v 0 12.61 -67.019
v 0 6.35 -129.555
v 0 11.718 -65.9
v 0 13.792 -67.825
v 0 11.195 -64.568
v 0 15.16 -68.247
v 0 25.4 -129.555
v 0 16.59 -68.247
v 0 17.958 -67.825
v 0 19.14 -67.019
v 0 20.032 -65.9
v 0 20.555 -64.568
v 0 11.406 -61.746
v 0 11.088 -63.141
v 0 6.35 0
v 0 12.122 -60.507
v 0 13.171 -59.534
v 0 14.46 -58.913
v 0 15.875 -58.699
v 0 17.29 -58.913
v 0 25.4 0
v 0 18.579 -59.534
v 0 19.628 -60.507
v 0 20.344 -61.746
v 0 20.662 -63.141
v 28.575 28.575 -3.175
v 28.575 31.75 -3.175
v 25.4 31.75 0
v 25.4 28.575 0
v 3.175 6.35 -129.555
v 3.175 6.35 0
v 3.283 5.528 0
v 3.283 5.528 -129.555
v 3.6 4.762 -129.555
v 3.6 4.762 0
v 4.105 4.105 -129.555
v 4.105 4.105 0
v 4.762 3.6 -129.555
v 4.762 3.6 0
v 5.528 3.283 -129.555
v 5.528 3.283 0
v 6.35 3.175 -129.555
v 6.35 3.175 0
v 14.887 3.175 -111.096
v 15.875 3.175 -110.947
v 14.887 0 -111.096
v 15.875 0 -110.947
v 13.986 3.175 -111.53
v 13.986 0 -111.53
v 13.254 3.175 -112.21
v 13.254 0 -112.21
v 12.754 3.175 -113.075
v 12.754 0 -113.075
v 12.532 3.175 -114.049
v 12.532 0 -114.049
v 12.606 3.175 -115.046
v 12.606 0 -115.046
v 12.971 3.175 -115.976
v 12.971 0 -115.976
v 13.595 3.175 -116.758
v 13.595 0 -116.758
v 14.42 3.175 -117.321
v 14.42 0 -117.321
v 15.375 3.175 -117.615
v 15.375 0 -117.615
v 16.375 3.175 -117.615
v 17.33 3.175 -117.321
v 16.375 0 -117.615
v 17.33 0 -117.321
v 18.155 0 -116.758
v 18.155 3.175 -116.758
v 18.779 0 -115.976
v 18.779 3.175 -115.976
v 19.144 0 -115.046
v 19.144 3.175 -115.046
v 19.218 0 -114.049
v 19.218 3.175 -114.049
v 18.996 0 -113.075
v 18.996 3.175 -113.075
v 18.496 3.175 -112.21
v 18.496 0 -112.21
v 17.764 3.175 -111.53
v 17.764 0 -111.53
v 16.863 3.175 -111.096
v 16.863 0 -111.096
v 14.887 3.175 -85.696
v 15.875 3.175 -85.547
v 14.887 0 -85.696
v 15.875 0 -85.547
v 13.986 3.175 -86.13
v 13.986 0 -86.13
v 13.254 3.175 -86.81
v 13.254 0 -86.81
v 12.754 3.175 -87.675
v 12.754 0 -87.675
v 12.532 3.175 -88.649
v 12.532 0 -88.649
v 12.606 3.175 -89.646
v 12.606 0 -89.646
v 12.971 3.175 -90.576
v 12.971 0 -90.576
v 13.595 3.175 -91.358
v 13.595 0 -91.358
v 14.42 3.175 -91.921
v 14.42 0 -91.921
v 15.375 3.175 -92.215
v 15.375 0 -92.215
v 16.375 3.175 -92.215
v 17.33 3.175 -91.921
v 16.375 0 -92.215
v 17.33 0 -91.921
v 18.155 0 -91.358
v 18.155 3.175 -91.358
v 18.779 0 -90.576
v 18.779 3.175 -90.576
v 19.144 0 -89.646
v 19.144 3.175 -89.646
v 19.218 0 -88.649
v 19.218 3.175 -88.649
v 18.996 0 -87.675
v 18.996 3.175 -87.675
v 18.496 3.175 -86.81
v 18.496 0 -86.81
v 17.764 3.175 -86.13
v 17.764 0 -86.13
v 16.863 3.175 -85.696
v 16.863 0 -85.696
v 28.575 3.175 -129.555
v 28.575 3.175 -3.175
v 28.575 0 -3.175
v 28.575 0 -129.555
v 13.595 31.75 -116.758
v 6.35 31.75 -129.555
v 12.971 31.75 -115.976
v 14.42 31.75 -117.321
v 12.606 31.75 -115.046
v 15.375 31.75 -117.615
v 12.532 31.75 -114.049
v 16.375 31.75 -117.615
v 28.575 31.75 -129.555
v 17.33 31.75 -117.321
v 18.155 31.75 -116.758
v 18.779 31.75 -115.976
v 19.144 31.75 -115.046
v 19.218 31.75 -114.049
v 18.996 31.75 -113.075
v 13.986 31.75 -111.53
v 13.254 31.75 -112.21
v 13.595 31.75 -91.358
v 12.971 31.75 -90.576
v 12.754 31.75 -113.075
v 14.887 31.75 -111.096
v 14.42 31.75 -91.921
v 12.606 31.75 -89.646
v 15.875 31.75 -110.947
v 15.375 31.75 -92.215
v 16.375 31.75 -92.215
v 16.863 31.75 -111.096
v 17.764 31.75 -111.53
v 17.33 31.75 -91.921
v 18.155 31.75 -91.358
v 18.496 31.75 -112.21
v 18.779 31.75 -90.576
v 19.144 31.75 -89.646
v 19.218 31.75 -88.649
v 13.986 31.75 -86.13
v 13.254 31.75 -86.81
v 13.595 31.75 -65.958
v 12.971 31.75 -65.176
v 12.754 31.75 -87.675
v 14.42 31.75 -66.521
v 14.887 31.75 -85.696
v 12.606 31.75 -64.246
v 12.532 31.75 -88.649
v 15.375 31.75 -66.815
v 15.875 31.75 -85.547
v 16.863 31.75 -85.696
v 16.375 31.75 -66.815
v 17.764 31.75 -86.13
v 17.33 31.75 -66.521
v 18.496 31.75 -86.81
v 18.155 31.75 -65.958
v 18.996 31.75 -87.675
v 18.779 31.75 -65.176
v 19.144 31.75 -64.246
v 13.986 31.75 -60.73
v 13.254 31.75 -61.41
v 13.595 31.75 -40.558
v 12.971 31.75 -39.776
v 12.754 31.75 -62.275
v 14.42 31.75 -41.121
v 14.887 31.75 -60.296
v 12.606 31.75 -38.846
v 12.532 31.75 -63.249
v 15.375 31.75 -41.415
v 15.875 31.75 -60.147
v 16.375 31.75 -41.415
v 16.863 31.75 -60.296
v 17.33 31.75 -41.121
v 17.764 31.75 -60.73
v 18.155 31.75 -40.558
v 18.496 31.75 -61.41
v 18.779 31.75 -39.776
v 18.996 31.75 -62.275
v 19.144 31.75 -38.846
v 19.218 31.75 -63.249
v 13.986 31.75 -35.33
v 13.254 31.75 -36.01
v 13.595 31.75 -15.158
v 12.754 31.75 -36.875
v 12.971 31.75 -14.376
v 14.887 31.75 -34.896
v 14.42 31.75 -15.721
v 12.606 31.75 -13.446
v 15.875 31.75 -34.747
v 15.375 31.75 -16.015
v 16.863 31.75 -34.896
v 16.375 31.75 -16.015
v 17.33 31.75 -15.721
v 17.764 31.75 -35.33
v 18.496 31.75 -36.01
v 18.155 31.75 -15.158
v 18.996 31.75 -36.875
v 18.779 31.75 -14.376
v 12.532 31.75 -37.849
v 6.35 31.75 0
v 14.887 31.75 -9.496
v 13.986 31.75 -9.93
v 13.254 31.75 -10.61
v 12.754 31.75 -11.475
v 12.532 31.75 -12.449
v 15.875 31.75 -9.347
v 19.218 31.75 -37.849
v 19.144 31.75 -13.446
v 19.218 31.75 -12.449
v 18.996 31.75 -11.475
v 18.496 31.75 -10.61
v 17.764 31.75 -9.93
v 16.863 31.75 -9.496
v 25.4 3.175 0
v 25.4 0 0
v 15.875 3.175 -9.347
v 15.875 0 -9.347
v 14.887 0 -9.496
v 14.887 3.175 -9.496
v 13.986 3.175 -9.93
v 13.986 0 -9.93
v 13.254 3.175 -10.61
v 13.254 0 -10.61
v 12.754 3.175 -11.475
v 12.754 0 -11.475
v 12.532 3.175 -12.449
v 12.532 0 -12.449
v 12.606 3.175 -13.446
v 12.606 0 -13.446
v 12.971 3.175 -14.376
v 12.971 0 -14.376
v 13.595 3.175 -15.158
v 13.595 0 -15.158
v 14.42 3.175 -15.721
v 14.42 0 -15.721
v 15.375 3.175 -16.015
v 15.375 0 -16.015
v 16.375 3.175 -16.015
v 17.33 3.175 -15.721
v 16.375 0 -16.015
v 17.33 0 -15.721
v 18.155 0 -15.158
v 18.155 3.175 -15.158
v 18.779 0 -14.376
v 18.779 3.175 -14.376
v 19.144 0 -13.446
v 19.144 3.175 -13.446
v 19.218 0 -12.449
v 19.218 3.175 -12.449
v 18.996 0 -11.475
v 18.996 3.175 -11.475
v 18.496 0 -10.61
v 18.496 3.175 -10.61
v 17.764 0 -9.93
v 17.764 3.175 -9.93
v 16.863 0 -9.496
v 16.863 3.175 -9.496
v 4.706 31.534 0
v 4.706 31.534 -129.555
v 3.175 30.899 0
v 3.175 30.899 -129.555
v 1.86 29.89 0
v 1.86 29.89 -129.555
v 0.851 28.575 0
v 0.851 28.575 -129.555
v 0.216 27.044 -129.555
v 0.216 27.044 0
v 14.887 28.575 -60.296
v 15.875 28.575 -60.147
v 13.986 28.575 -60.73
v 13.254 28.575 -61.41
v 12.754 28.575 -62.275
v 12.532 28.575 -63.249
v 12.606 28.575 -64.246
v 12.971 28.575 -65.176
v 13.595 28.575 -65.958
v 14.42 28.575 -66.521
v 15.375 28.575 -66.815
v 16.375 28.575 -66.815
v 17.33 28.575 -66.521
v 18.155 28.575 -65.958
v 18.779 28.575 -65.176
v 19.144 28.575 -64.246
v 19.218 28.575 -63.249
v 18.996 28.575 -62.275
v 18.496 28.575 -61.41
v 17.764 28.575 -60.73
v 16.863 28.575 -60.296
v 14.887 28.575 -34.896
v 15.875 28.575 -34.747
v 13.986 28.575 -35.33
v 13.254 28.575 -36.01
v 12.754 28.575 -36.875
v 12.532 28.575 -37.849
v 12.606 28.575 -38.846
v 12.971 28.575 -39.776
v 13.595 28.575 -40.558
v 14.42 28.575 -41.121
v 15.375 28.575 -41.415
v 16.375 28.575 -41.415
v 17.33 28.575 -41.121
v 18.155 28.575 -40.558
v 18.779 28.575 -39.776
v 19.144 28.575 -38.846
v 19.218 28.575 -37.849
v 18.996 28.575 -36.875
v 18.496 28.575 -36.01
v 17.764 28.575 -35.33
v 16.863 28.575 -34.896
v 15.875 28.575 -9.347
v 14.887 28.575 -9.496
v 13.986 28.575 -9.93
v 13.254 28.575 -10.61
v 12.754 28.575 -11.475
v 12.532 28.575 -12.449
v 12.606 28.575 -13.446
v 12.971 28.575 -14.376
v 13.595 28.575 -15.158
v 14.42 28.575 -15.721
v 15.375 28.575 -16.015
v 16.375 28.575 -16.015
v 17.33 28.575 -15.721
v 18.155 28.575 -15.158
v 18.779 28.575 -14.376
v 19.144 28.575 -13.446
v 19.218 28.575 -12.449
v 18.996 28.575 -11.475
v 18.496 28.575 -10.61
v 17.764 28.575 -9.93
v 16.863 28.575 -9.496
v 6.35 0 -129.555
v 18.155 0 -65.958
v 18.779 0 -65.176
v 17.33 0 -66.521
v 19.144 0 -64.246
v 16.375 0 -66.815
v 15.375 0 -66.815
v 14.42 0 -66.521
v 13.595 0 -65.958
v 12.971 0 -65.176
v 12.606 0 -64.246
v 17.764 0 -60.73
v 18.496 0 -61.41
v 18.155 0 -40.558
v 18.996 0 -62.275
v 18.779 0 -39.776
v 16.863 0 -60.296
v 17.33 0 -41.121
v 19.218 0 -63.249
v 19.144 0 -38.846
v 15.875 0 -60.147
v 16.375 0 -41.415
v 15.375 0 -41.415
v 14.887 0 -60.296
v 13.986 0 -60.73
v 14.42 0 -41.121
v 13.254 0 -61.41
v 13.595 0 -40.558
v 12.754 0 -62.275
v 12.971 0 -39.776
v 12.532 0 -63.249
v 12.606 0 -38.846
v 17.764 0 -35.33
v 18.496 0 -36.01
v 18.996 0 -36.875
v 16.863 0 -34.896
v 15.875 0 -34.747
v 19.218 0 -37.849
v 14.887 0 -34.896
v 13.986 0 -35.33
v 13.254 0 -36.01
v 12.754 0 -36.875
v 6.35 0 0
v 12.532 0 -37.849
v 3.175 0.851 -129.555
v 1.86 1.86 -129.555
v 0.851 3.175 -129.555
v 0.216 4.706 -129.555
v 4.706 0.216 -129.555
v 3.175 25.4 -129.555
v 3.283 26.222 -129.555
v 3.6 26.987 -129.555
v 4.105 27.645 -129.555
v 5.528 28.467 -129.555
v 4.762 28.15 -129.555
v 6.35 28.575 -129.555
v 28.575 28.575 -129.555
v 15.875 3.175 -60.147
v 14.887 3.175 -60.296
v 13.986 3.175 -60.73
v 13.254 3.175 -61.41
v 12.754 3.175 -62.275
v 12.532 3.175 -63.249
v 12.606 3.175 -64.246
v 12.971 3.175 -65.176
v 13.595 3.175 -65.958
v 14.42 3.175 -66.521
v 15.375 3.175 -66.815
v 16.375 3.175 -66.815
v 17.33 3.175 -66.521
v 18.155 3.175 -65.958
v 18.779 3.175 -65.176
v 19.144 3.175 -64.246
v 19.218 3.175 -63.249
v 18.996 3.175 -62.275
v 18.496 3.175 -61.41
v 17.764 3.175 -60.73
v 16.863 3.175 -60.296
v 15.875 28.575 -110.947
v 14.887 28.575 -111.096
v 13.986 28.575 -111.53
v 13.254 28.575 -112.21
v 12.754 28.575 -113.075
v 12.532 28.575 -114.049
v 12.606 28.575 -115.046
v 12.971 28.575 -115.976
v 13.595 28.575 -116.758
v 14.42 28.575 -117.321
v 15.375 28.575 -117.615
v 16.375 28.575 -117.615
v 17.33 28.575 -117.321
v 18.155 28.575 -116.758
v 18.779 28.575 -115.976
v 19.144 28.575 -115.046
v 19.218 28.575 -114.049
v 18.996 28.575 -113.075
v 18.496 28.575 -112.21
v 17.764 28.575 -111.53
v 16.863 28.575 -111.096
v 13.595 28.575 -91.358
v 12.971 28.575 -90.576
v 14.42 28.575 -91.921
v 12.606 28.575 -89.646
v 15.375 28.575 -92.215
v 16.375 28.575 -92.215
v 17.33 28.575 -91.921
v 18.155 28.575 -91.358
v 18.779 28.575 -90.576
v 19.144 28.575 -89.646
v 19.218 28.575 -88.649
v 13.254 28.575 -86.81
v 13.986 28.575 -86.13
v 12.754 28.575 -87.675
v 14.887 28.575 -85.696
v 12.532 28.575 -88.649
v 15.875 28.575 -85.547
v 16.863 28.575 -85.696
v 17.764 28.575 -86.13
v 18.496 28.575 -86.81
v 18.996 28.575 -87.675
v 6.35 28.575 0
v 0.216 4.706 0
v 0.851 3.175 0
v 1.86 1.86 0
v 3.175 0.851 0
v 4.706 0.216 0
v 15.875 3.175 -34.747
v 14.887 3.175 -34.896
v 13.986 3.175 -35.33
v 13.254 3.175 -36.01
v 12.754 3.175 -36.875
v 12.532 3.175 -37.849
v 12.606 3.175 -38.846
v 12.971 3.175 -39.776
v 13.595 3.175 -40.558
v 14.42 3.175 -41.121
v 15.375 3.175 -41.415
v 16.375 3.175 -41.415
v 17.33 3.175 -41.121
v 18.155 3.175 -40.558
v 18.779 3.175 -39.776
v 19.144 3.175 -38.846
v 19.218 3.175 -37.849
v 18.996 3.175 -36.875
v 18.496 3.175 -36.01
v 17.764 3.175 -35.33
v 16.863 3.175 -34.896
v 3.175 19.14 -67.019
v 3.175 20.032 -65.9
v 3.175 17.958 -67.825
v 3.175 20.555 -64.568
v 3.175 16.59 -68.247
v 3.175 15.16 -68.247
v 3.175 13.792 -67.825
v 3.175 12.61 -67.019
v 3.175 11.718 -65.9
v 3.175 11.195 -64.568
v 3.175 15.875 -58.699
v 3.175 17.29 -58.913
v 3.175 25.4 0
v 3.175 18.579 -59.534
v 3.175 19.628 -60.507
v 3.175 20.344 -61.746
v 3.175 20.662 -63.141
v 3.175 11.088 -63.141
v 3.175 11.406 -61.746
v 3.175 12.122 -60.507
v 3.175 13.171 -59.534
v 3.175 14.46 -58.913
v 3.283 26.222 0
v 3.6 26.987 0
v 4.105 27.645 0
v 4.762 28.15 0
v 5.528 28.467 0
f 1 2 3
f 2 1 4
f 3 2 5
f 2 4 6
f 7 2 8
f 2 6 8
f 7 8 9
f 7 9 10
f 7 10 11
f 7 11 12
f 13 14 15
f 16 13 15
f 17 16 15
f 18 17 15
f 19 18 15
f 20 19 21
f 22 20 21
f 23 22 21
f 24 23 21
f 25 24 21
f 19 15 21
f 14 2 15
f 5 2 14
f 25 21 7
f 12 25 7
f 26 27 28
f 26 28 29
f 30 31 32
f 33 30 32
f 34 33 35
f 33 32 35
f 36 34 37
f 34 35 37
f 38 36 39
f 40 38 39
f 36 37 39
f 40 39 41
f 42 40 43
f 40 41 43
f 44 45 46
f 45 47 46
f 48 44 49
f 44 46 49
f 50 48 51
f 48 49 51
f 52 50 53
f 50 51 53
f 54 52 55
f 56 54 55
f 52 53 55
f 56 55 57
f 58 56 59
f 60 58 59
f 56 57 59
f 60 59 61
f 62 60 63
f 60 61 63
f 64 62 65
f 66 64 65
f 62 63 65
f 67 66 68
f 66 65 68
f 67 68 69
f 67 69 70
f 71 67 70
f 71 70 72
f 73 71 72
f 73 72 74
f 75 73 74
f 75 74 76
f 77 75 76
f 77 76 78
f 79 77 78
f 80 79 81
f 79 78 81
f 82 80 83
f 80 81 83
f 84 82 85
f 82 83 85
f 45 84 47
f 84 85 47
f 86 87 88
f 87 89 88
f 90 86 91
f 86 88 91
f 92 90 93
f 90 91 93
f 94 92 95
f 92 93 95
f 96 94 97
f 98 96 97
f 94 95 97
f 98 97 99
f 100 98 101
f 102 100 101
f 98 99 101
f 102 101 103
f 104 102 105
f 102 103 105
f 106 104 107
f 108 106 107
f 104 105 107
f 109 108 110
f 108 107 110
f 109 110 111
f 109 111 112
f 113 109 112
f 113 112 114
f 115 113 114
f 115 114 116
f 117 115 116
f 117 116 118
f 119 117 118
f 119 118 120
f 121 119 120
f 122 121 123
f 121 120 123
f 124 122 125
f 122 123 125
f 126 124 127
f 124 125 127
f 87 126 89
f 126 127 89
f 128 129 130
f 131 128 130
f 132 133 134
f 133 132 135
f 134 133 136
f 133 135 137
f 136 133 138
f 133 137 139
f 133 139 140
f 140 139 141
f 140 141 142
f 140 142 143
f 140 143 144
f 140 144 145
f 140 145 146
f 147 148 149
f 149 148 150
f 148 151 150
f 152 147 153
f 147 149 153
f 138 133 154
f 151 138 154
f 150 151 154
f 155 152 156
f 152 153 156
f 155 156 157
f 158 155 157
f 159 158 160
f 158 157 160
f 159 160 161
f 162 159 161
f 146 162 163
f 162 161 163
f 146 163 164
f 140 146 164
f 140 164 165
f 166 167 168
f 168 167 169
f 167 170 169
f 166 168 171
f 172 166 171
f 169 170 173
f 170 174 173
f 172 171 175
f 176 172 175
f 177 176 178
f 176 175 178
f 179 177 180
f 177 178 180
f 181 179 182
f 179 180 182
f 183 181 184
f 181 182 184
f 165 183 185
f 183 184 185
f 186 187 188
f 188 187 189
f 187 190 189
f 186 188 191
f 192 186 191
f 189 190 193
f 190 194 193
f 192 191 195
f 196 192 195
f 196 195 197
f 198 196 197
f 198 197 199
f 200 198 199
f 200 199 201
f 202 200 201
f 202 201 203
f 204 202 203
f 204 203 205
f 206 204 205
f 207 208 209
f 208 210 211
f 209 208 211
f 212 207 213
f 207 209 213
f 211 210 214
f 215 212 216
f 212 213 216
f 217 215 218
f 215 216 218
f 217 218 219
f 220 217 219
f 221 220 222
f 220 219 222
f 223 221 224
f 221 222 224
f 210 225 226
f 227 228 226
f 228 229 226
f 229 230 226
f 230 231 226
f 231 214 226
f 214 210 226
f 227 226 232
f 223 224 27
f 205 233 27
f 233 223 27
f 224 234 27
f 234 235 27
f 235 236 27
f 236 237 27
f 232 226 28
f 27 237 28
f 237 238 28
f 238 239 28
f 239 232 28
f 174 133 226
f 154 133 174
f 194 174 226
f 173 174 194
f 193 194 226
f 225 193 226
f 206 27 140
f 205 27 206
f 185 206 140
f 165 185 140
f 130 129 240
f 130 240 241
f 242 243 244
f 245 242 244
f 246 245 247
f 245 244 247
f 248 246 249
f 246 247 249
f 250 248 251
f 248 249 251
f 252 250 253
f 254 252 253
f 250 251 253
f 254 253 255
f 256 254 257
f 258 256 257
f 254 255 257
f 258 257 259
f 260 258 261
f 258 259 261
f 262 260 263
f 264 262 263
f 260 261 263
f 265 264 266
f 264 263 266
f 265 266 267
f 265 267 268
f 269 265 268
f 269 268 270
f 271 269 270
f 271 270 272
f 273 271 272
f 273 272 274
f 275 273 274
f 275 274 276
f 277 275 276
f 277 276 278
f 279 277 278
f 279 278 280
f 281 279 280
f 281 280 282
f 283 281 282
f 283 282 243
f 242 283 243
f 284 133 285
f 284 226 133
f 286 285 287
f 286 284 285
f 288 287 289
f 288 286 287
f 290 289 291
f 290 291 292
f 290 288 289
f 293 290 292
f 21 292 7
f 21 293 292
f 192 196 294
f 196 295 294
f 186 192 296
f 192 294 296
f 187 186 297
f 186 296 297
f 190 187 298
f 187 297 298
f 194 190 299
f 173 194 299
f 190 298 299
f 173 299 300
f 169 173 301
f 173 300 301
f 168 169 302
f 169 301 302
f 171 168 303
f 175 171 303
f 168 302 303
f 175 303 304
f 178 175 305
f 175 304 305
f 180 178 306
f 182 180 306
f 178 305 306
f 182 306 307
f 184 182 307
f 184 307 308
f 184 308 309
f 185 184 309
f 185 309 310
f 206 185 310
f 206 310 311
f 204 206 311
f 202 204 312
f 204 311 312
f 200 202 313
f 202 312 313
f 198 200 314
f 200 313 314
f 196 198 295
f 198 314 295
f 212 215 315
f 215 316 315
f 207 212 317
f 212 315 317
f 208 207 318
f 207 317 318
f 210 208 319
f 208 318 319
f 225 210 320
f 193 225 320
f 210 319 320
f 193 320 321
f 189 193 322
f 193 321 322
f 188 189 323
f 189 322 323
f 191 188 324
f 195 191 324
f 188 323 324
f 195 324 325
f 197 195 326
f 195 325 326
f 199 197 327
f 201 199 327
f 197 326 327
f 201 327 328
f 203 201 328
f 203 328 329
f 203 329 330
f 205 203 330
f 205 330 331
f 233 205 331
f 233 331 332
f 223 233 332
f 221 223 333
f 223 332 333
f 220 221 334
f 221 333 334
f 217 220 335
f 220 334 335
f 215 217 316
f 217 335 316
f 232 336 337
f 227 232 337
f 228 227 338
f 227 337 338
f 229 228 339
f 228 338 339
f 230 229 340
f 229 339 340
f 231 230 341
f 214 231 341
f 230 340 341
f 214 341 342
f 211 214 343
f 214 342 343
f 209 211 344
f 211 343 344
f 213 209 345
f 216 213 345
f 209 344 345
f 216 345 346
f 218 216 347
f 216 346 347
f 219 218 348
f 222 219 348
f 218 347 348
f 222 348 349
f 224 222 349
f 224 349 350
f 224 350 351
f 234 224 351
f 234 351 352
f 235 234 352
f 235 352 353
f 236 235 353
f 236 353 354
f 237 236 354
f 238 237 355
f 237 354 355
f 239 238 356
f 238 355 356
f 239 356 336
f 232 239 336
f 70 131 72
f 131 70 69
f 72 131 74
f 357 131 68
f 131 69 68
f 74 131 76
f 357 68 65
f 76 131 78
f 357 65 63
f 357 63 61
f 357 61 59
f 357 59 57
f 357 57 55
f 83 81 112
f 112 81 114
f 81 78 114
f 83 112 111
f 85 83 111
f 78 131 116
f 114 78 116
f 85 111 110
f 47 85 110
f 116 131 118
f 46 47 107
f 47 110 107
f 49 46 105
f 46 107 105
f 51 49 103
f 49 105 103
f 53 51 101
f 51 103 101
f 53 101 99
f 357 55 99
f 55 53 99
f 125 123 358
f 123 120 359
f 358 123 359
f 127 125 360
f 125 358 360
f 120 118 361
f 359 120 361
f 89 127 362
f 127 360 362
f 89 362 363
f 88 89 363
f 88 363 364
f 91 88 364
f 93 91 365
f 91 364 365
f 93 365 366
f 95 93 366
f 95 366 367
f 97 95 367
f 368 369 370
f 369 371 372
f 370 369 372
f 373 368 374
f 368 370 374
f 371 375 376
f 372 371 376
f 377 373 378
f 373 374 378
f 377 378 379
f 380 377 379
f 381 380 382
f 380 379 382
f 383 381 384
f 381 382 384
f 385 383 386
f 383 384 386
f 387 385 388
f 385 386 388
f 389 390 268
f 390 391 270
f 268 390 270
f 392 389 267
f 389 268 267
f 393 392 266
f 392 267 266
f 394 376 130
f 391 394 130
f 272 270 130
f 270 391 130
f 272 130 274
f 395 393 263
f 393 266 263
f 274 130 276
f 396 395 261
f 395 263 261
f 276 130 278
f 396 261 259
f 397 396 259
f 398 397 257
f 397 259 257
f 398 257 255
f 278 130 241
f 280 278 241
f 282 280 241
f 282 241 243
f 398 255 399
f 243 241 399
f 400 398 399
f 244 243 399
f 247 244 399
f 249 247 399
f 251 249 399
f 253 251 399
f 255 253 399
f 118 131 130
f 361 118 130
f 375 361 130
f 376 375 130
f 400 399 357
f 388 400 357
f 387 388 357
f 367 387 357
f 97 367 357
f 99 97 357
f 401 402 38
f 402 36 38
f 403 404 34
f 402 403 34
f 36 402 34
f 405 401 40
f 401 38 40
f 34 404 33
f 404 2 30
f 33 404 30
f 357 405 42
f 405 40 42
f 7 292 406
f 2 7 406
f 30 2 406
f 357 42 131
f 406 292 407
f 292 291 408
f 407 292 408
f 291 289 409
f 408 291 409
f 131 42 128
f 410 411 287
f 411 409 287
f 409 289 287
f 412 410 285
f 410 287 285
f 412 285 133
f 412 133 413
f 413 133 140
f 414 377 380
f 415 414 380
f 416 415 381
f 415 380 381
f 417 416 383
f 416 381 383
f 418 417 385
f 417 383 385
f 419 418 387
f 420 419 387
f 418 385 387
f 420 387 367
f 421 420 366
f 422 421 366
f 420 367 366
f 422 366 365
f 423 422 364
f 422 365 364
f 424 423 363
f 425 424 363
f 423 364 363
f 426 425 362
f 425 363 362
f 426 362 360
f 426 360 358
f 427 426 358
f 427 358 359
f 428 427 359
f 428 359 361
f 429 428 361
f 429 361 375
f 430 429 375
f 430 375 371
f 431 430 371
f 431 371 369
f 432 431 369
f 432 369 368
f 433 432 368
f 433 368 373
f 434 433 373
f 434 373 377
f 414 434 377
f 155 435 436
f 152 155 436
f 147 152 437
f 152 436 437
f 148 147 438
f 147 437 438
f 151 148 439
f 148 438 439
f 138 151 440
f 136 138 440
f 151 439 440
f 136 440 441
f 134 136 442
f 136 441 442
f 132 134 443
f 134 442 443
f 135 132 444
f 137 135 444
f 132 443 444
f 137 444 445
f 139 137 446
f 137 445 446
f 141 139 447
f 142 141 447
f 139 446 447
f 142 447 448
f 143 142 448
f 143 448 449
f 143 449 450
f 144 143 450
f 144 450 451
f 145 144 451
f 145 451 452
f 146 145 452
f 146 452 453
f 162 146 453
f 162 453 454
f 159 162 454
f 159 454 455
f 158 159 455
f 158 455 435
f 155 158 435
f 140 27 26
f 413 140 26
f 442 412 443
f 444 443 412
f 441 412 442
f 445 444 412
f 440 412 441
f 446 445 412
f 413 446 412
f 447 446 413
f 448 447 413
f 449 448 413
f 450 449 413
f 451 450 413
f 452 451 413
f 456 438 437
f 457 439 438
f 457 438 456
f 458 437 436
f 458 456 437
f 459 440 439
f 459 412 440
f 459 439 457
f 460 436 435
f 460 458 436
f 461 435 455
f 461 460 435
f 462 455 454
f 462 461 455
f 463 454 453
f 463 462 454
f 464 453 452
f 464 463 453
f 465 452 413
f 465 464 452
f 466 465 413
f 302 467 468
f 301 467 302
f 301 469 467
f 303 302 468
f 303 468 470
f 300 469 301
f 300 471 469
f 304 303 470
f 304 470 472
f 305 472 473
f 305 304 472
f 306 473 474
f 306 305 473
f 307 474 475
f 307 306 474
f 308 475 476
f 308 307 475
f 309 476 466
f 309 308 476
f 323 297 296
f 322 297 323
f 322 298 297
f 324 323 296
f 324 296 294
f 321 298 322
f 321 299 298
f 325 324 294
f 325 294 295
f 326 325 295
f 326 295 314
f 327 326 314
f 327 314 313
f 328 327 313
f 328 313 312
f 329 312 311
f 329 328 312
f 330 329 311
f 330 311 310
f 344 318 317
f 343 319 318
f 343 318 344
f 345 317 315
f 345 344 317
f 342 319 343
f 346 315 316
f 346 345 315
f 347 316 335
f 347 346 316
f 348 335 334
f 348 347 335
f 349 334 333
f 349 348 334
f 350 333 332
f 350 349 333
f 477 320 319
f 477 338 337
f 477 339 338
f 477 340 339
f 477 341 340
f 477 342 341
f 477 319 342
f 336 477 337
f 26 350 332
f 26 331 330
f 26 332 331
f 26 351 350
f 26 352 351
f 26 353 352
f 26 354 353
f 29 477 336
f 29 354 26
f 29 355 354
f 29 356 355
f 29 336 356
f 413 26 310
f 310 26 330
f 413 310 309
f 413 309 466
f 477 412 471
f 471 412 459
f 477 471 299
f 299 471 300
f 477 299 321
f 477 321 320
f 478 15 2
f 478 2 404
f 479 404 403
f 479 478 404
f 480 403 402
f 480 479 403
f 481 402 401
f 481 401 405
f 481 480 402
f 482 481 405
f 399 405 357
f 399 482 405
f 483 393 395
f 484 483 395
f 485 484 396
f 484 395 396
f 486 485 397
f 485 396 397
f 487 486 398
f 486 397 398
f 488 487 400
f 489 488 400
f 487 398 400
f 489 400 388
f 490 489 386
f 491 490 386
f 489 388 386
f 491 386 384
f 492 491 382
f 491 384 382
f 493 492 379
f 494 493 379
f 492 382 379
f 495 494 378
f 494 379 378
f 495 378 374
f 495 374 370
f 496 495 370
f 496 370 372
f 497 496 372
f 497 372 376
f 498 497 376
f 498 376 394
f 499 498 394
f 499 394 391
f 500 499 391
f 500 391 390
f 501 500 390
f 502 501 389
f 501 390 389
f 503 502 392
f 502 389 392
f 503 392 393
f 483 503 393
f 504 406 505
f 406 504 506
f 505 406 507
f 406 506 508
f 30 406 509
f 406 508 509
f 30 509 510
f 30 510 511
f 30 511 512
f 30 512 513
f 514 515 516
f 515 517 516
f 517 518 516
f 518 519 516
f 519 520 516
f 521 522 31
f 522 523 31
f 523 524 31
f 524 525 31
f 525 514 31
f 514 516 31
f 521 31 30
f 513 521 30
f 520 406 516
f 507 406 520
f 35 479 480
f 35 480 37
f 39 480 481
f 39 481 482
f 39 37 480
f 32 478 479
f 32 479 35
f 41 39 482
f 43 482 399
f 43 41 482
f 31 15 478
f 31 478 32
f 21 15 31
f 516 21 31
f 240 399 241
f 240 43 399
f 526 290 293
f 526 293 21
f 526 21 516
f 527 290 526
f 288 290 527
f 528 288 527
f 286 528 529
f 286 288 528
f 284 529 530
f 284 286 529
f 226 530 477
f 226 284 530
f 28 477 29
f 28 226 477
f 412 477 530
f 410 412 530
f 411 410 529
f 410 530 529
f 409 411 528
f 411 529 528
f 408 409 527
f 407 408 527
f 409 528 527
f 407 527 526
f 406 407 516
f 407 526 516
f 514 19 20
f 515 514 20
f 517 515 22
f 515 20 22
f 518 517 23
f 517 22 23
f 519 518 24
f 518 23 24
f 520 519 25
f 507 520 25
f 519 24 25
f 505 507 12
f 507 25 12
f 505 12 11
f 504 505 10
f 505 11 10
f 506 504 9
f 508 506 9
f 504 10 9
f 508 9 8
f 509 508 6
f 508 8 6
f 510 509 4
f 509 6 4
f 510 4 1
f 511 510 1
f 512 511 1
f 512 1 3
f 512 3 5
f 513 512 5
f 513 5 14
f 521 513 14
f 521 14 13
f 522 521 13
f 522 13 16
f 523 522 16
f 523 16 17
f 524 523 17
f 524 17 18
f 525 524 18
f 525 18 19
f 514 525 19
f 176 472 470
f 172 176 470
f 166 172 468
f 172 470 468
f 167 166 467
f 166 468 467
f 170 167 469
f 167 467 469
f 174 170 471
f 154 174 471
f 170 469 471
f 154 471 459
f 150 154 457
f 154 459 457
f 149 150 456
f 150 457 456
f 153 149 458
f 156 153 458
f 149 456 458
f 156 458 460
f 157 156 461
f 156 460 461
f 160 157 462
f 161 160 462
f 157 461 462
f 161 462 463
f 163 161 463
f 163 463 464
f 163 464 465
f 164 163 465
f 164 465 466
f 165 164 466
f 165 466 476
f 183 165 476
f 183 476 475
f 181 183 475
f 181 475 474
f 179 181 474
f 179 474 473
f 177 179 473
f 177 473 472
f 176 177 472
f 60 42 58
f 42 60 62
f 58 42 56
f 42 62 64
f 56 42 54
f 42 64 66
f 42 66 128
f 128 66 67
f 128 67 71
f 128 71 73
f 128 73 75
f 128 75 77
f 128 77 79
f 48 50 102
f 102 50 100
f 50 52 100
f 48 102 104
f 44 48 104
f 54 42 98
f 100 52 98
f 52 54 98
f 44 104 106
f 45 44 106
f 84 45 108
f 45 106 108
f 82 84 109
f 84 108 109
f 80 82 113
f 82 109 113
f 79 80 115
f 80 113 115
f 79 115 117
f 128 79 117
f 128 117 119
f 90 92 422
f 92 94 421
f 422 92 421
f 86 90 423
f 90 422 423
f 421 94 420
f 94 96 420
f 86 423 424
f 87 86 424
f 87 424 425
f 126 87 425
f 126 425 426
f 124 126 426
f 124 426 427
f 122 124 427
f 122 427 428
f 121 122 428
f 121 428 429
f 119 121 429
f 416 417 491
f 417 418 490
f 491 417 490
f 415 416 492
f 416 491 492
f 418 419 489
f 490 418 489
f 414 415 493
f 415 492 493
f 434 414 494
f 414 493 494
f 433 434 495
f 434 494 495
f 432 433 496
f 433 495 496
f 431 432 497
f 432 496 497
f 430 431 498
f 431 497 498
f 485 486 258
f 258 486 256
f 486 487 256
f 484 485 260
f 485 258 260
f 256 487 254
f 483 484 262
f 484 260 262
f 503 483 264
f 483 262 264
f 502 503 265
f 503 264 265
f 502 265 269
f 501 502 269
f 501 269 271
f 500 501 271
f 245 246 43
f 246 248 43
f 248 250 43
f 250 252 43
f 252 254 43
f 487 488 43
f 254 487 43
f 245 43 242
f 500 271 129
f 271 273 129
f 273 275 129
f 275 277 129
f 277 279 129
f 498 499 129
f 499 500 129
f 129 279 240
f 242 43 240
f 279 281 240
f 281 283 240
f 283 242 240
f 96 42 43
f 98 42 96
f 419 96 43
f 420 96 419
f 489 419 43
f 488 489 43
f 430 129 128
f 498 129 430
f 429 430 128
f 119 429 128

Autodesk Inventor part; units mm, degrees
ref_plane "YZ Plane" through (0, 0, 0) normal (1, 0, 0) x (0, 1, 0)
ref_plane "XZ Plane" through (0, 0, 0) normal (0, 1, 0) x (-1, 0, 0)
ref_plane "XY Plane" through (0, 0, 0) normal (0, 0, 1) x (1, 0, 0)
sketch "Sketch1" plane through (0, 0, 0) normal (0, 0, 1) x (1, 0, 0)
  line L0 (6.35, 28.575) -> (25.4, 28.575)
  line L1 (6.35, 31.75) -> (25.4, 31.75)
  line L2 (25.4, 0) -> (6.35, 0)
  arc A0 (0, 6.35) -> (6.35, 0) centre (6.35, 6.35) ccw
  line L3 (0, 6.35) -> (0, 25.4)
  arc A1 (6.35, 31.75) -> (0, 25.4) centre (6.35, 25.4) ccw
  line L4 (6.35, 31.75) -> (25.4, 31.75)
  line L5 (25.4, 28.575) -> (6.35, 28.575)
  arc A2 (6.35, 28.575) -> (3.175, 25.4) centre (6.35, 25.4) ccw
  line L6 (3.175, 25.4) -> (3.175, 6.35)
  arc A3 (3.175, 6.35) -> (6.35, 3.175) centre (6.35, 6.35) ccw
  line L7 (6.35, 3.175) -> (25.4, 3.175)
  line L8 (28.575, 3.175) -> (28.575, 0)
  line L9 (25.4, 31.75) -> (28.575, 31.75)
  line L10 (28.575, 28.575) -> (25.4, 28.575)
  line L11 (28.575, 31.75) -> (28.575, 28.575)
  line L12 (28.575, 0) -> (25.4, 0)
  line L13 (28.575, 3.175) -> (28.575, 0)
  line L14 (25.4, 3.175) -> (28.575, 3.175)
  point P0 (0, 0)
extrude "Extrusion1" add sketch "Sketch1" against normal blind 762
chamfer "Chamfer1" distance 3.175 angle 45 4 edges at (28.575, 30.1625, 0) (28.575, 1.5875, 0) (28.575, 30.1625, -762) (28.575, 1.5875, -762)
sketch "Sketch2" plane through (6.35, 31.75, 0) normal (0, 1, 0) x (1, 0, 0)
  line L0 (19.05, 0) -> (0, 0) projected
  line L1 (22.225, 3.175) -> (22.225, 758.825) projected
  point P0 (-6.35, 0)
  point P1 (9.525, 12.7)
  dimension "d5" = 12.7
  dimension "d6" = 12.7
hole "Hole1" at (15.875, 31.75, -12.7) direction (0, -1, 0) diameter 6.7056 end through all
pattern_linear "Rectangular Pattern1" count 30 spacing 25.4 along (0, 0, -1) of "Hole1"
sketch "Sketch3" plane through (0, 6.35, 0) normal (-1, 0, 0) x (0, 0, 1)
  line L0 (-0.2722, 19.0092) -> (-759.0056, 19.0092)
  line L1 (-759.0056, 19.0092) -> (-759.0056, 0.0408)
  line L2 (-0.2722, 0.0408) -> (-759.0056, 0.0408)
  line L3 (-0.2722, 0.0408) -> (-0.2722, 19.0092)
  circle A0 centre (-698.5852, 9.525) radius 4.78
  circle A1 centre (-111.2243, 9.525) radius 4.78
  circle A2 centre (-188.7416, 9.525) radius 3.6672
  circle A3 centre (-277.2605, 9.525) radius 3.6672
  circle A4 centre (-481.9921, 9.525) radius 3.6672
  circle A5 centre (-570.511, 9.525) radius 3.6672
  circle A6 centre (-469.3591, 9.525) radius 3.6672
  circle A7 centre (-583.1692, 9.525) radius 3.6672
  circle A8 centre (-289.9187, 9.525) radius 3.6672
  circle A9 centre (-176.1087, 9.525) radius 3.6672
  circle A10 centre (-551.6311, 9.525) radius 4.78
  circle A11 centre (-526.34, 9.525) radius 4.78
  circle A12 centre (-501.0489, 9.525) radius 4.78
  circle A13 centre (-258.2289, 9.525) radius 4.78
  circle A14 centre (-232.9378, 9.525) radius 4.78
  circle A15 centre (-207.6467, 9.525) radius 4.78
  circle A16 centre (-607.2589, 9.525) radius 1.5807
  circle A17 centre (-152.0189, 9.525) radius 1.5807
  circle A18 centre (-379.6389, 5.9842) radius 4.78
  circle A19 centre (-85.9332, 9.525) radius 4.78
  circle A20 centre (-673.294, 9.525) radius 4.78
  circle A21 centre (-648.0029, 9.525) radius 4.78
  circle A22 centre (-63.5, 9.525) radius 4.8006
  point P0 (0, -6.35)
  point P1 (-759.0056, -6.2819)
  dimension "d21" = 9.6012
extrude "Extrusion2" [suppressed]
sketch "Sketch4" plane through (6.35, 31.75, 0) normal (0, 1, 0) x (1, 0, 0)
  line L0 (-18.2452, 129.5546) -> (88.0083, 129.5546)
  line L1 (88.0083, 129.5546) -> (88.0083, 1027.7541)
  line L2 (88.0083, 1027.7541) -> (-18.2452, 1027.7541)
  line L3 (-18.2452, 1027.7541) -> (-18.2452, 129.5546)
  point P0 (-6.35, 0)
extrude "Extrusion3" cut sketch "Sketch4" against normal blind 50.8
sketch "Sketch5" plane through (0, 6.35, 0) normal (-1, 0, 0) x (0, 0, 1)
  circle A0 centre (-63.5, 9.525) radius 4.8006
  dimension "d23" = 9.6012
extrude "Extrusion4" cut sketch "Sketch5" against normal through all
properties part number "am-2222" material "Aluminum 6061"
